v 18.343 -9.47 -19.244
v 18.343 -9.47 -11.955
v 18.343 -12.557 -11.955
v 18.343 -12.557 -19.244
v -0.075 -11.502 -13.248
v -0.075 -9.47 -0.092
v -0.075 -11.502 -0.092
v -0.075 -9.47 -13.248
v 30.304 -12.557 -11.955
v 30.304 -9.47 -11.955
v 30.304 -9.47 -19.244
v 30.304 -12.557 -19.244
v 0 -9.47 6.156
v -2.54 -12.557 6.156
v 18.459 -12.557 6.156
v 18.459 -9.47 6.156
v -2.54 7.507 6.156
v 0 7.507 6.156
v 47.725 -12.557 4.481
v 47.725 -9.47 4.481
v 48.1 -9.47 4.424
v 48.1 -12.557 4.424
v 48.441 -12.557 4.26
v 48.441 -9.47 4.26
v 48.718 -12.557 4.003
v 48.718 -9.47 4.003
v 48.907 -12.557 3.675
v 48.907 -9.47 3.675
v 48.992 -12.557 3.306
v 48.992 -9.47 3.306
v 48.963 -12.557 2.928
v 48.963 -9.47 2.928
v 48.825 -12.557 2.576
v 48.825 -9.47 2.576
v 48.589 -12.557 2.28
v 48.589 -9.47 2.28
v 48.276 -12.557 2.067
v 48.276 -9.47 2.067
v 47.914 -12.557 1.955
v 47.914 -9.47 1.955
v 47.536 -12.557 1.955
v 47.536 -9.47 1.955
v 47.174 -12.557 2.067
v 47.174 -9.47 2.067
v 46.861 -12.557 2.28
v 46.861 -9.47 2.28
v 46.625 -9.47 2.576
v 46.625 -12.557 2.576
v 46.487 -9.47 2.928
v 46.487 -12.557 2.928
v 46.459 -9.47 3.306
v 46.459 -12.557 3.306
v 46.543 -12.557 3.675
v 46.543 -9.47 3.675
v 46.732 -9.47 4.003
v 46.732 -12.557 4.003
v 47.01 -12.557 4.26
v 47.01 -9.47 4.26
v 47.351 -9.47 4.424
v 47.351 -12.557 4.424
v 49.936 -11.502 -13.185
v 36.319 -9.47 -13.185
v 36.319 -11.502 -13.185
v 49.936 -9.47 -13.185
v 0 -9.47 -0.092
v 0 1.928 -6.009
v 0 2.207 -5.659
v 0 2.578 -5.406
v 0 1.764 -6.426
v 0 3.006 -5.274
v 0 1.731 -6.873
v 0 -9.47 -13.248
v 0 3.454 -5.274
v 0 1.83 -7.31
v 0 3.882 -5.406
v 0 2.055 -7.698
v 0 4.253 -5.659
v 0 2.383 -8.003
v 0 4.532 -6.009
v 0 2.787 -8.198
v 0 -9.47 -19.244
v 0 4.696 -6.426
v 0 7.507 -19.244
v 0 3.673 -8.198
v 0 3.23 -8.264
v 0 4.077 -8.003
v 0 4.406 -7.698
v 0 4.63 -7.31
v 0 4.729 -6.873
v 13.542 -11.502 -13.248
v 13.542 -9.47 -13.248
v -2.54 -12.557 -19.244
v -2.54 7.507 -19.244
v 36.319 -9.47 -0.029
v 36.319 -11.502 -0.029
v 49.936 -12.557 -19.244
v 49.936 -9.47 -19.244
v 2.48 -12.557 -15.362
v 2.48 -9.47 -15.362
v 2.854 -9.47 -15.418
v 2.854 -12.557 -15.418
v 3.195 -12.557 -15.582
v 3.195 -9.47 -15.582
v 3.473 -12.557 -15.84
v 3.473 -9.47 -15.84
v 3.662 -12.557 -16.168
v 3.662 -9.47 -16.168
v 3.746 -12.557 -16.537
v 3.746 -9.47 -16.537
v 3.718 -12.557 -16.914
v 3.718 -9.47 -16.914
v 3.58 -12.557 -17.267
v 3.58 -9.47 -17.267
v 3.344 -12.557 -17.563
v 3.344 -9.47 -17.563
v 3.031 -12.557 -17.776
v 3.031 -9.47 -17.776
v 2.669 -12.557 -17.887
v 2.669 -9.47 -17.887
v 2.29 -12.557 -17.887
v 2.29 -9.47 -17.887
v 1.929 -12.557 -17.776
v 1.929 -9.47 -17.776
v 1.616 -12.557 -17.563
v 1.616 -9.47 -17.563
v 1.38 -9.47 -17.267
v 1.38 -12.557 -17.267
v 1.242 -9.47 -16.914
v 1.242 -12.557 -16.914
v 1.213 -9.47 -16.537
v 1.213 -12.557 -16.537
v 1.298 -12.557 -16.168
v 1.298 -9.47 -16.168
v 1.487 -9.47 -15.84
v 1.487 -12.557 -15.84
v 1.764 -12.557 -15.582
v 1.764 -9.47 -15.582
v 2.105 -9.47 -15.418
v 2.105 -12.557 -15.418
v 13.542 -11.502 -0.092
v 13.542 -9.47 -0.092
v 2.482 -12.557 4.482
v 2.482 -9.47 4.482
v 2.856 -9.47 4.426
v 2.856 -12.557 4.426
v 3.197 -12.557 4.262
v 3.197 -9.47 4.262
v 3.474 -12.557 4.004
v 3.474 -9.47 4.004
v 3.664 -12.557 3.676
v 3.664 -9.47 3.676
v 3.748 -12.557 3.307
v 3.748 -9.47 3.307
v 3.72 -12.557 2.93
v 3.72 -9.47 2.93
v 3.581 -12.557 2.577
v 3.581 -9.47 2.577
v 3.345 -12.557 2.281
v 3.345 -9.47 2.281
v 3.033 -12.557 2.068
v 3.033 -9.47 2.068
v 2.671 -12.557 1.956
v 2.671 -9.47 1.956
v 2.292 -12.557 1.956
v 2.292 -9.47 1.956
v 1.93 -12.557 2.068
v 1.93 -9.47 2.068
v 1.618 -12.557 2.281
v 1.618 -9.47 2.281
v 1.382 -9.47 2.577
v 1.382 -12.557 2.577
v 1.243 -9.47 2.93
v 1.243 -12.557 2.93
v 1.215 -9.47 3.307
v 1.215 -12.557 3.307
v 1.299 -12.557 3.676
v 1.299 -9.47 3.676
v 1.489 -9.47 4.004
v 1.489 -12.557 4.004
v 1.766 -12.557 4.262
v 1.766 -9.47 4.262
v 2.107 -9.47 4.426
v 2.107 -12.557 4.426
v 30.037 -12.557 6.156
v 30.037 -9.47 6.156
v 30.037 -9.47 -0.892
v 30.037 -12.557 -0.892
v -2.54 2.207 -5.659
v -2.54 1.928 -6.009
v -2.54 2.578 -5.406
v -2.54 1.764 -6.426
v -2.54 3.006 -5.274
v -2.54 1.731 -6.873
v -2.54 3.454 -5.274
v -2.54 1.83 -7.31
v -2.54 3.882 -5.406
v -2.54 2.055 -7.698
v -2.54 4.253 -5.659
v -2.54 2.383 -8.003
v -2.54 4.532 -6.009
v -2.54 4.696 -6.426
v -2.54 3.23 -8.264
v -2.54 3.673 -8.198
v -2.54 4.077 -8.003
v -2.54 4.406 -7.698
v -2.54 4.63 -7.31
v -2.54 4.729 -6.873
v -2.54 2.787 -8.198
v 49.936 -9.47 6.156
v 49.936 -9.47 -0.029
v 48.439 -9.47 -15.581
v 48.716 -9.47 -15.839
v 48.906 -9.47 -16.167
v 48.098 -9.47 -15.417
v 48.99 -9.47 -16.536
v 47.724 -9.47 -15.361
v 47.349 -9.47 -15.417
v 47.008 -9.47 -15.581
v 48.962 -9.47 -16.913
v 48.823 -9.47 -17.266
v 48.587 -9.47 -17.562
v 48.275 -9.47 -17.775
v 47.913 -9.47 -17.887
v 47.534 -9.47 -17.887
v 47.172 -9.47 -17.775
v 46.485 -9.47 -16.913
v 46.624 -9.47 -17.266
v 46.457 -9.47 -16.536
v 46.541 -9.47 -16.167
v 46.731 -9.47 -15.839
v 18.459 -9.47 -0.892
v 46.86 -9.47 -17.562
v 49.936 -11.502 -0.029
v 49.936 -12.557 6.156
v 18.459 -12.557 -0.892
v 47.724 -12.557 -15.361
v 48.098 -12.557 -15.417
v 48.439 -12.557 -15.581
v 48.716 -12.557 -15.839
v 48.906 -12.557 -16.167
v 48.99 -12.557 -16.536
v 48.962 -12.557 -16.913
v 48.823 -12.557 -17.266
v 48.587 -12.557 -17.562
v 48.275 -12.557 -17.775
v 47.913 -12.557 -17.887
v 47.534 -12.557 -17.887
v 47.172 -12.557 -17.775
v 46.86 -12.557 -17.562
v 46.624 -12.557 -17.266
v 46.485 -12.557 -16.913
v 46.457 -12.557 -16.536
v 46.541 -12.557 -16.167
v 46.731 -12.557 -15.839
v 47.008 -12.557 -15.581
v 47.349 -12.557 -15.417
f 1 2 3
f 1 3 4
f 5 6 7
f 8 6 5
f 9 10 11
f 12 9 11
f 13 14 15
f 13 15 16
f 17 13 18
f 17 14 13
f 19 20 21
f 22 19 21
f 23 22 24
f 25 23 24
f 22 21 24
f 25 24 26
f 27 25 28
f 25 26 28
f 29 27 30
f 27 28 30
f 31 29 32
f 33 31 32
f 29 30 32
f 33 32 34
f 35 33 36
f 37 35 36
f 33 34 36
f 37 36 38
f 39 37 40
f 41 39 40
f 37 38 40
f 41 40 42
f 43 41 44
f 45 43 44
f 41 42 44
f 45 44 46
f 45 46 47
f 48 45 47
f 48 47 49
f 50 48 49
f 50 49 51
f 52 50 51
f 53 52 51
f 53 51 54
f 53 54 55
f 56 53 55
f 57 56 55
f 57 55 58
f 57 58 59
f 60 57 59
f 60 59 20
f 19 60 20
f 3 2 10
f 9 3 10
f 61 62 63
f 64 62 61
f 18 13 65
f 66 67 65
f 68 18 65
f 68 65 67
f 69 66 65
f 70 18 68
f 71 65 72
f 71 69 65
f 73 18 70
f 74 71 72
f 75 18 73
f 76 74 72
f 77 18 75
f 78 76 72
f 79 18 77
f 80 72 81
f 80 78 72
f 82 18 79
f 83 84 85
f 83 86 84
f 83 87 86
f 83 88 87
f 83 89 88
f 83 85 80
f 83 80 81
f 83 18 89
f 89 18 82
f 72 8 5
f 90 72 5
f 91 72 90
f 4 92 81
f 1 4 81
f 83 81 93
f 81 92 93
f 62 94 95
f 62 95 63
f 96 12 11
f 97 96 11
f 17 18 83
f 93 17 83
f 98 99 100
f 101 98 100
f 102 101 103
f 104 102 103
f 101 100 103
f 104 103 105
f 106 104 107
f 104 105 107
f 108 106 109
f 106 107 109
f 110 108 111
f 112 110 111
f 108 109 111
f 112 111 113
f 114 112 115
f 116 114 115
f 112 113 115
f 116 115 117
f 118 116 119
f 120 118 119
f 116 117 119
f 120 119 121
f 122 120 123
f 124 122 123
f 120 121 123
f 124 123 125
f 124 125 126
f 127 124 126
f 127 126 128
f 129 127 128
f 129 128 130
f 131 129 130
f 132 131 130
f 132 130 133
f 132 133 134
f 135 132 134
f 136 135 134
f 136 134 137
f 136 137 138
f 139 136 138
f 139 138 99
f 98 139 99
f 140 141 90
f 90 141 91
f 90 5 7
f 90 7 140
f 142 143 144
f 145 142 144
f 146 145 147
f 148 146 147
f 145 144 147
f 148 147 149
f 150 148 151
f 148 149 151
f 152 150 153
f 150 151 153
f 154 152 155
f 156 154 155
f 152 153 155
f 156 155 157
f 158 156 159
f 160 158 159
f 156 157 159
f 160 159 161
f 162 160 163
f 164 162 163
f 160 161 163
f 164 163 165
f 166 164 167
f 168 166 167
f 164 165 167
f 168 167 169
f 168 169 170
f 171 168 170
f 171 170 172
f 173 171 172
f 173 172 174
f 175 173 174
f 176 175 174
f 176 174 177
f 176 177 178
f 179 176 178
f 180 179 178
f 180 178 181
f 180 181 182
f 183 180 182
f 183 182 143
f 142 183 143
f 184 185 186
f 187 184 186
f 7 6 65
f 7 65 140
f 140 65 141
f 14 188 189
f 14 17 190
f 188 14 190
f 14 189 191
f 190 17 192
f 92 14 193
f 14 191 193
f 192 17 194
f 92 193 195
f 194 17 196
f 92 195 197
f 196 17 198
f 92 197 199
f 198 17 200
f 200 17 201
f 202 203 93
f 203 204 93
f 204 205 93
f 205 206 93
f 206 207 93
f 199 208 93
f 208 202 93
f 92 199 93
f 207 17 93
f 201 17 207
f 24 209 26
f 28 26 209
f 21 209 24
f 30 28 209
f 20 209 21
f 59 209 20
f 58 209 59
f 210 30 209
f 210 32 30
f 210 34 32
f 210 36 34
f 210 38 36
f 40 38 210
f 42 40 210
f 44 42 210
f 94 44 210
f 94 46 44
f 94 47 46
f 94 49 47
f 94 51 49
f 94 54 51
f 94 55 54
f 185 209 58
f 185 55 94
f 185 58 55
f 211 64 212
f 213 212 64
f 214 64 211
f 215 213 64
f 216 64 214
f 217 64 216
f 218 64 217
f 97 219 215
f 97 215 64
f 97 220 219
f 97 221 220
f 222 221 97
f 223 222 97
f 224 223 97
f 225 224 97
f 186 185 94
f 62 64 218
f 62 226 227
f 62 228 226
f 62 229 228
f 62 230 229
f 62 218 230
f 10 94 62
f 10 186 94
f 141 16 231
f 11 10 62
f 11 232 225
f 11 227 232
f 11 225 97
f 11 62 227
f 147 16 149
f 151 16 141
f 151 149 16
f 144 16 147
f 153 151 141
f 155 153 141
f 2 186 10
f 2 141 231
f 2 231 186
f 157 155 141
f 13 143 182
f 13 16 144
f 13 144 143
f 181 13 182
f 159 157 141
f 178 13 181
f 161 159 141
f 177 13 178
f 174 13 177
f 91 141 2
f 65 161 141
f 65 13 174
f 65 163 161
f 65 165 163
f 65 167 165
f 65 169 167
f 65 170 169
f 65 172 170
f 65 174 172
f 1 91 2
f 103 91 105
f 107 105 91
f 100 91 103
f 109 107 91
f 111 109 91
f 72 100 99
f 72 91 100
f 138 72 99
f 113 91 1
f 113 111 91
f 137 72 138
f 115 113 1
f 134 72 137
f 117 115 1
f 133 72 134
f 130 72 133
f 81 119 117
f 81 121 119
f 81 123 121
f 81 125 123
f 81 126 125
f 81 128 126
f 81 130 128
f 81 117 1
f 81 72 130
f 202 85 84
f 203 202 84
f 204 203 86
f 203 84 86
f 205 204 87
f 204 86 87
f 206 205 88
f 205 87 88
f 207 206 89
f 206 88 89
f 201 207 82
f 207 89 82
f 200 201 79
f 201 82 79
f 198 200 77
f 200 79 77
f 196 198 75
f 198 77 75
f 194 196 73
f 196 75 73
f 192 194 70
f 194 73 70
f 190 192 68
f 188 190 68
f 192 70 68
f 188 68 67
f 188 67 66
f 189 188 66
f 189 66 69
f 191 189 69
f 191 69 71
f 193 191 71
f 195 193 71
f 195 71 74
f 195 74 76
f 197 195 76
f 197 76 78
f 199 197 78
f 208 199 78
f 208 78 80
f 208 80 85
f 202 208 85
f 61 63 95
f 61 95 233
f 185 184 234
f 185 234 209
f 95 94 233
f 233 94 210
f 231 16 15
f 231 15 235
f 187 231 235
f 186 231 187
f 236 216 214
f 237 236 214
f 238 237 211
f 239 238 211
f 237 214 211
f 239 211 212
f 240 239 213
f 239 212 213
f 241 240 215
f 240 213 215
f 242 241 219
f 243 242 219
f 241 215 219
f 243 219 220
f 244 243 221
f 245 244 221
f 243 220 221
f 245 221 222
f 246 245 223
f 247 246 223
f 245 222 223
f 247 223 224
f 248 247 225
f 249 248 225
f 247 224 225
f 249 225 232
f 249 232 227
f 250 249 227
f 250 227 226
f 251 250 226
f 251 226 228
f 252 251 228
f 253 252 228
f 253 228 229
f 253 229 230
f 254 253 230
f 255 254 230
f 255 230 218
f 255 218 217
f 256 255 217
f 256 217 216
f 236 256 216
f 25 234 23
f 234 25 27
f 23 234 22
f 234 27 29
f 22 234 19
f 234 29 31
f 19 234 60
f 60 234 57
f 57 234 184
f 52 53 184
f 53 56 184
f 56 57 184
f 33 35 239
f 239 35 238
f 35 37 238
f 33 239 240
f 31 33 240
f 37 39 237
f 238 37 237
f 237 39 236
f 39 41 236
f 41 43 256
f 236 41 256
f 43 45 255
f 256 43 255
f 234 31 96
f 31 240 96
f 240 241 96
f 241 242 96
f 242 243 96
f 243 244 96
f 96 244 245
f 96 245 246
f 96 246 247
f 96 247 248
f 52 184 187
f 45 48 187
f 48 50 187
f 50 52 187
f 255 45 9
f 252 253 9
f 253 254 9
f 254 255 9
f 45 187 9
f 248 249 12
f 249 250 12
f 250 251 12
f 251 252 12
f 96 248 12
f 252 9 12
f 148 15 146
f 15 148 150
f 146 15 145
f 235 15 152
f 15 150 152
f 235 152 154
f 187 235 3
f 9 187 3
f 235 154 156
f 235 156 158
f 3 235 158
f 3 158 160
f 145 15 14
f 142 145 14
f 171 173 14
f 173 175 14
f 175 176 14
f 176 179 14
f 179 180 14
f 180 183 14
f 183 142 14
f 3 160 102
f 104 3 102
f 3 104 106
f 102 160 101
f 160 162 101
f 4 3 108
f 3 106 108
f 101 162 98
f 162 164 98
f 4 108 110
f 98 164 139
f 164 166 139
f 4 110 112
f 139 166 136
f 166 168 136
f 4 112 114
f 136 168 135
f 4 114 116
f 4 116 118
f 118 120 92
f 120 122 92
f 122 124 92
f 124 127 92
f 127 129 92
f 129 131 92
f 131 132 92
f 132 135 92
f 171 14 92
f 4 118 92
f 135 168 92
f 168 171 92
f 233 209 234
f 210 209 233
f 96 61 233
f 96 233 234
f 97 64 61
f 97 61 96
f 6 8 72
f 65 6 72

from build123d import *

# Parameters (mm, degrees)
SKETCH5_W           = 25.4
SKETCH5_H           = 25.4
BOSS_EXTRUDE2_DEPTH = 2.54
SKETCH6_W           = 25.4
SKETCH6_H           = 3.086684186
BOSS_EXTRUDE3_DEPTH = 49.9364
SKETCH7_R           = 1.27
CUT_EXTRUDE1_DEPTH  = 49.9364
SKETCH8_R           = 1.503583718
CUT_EXTRUDE2_DEPTH  = 49.9364
SKETCH9_W           = 11.960422389
SKETCH9_H           = 7.288882616
SKETCH9_W_2         = 11.577688012
SKETCH9_H_2         = 7.115600704
CUT_EXTRUDE4_DEPTH  = 5.08
SKETCH10_W          = 13.617142972
SKETCH10_H          = 13.156114308
SKETCH10_H_2        = 13.156114309
CUT_EXTRUDE5_DEPTH  = 2.032
SKETCH12_W          = 25.4
SKETCH12_H          = 5.336540019
CUT_EXTRUDE6_DEPTH  = 2.54


with BuildPart() as part:
    # Sketch5 → Boss-Extrude2 (new body)
    with BuildSketch(Plane(origin=(0, 0, 0), x_dir=(0, 0, -1), z_dir=(1, 0, 0))):
        with Locations((6.544263828, 0.143373815)):
            Rectangle(SKETCH5_W, SKETCH5_H)
    extrude(amount=-BOSS_EXTRUDE2_DEPTH)

    # Sketch6 → Boss-Extrude3 (add)
    with BuildSketch(Plane(origin=(0, 0, 0), x_dir=(0, 0, -1), z_dir=(1, 0, 0))):
        with Locations((6.544263828, -11.013284092)):
            Rectangle(SKETCH6_W, SKETCH6_H)
    extrude(amount=BOSS_EXTRUDE3_DEPTH)

    # Sketch7 → Cut-Extrude1 (cut)
    with BuildSketch(Plane(origin=(0, -9.469941999, 0), x_dir=(1, 0, 0), z_dir=(0, 1, 0))):
        with Locations(Location((2.479766783, 16.6315447, 0), (0, 0, 270))):
            Circle(SKETCH7_R)
        with Locations(Location((47.725207241, -3.210779596, 0), (0, 0, 270))):
            Circle(SKETCH7_R)
        with Locations(Location((47.723516777, 16.630771834, 0), (0, 0, 270))):
            Circle(SKETCH7_R)
        with Locations(Location((2.481517748, -3.212205223, 0), (0, 0, 270))):
            Circle(SKETCH7_R)
    extrude(amount=-CUT_EXTRUDE1_DEPTH, mode=Mode.SUBTRACT)

    # Sketch8 → Cut-Extrude2 (cut)
    with BuildSketch(Plane(origin=(0, 0, 0), x_dir=(0, 0, -1), z_dir=(1, 0, 0))):
        with Locations((6.760840433, 3.230058001)):
            Circle(SKETCH8_R)
    extrude(amount=-CUT_EXTRUDE2_DEPTH, mode=Mode.SUBTRACT)

    # Sketch9 → Cut-Extrude4 (cut)
    with BuildSketch(Plane(origin=(0, -9.469941999, 0), x_dir=(1, 0, 0), z_dir=(0, 1, 0))):
        with Locations((24.323492834, 15.59982252)):
            Rectangle(SKETCH9_W, SKETCH9_H)
        with Locations((24.247688593, -2.66541828)):
            Rectangle(SKETCH9_W_2, SKETCH9_H_2)
    extrude(amount=-CUT_EXTRUDE4_DEPTH, mode=Mode.SUBTRACT)

    # Sketch10 → Cut-Extrude5 (cut)
    with BuildSketch(Plane(origin=(0, -9.469941999, 0), x_dir=(1, 0, 0), z_dir=(0, 1, 0))):
        with Locations((6.733736813, 6.670159659)):
            Rectangle(SKETCH10_W, SKETCH10_H)
        with Locations((43.127828514, 6.607211743)):
            Rectangle(SKETCH10_W, SKETCH10_H_2)
    extrude(amount=-CUT_EXTRUDE5_DEPTH, mode=Mode.SUBTRACT)

    # Sketch12 → Cut-Extrude6 (cut)
    with BuildSketch(Plane(origin=(0, 0, 0), x_dir=(0, 0, -1), z_dir=(1, 0, 0))):
        with Locations((6.544263828, 10.175103806)):
            Rectangle(SKETCH12_W, SKETCH12_H)
    extrude(amount=-CUT_EXTRUDE6_DEPTH, mode=Mode.SUBTRACT)


solid = part.part
